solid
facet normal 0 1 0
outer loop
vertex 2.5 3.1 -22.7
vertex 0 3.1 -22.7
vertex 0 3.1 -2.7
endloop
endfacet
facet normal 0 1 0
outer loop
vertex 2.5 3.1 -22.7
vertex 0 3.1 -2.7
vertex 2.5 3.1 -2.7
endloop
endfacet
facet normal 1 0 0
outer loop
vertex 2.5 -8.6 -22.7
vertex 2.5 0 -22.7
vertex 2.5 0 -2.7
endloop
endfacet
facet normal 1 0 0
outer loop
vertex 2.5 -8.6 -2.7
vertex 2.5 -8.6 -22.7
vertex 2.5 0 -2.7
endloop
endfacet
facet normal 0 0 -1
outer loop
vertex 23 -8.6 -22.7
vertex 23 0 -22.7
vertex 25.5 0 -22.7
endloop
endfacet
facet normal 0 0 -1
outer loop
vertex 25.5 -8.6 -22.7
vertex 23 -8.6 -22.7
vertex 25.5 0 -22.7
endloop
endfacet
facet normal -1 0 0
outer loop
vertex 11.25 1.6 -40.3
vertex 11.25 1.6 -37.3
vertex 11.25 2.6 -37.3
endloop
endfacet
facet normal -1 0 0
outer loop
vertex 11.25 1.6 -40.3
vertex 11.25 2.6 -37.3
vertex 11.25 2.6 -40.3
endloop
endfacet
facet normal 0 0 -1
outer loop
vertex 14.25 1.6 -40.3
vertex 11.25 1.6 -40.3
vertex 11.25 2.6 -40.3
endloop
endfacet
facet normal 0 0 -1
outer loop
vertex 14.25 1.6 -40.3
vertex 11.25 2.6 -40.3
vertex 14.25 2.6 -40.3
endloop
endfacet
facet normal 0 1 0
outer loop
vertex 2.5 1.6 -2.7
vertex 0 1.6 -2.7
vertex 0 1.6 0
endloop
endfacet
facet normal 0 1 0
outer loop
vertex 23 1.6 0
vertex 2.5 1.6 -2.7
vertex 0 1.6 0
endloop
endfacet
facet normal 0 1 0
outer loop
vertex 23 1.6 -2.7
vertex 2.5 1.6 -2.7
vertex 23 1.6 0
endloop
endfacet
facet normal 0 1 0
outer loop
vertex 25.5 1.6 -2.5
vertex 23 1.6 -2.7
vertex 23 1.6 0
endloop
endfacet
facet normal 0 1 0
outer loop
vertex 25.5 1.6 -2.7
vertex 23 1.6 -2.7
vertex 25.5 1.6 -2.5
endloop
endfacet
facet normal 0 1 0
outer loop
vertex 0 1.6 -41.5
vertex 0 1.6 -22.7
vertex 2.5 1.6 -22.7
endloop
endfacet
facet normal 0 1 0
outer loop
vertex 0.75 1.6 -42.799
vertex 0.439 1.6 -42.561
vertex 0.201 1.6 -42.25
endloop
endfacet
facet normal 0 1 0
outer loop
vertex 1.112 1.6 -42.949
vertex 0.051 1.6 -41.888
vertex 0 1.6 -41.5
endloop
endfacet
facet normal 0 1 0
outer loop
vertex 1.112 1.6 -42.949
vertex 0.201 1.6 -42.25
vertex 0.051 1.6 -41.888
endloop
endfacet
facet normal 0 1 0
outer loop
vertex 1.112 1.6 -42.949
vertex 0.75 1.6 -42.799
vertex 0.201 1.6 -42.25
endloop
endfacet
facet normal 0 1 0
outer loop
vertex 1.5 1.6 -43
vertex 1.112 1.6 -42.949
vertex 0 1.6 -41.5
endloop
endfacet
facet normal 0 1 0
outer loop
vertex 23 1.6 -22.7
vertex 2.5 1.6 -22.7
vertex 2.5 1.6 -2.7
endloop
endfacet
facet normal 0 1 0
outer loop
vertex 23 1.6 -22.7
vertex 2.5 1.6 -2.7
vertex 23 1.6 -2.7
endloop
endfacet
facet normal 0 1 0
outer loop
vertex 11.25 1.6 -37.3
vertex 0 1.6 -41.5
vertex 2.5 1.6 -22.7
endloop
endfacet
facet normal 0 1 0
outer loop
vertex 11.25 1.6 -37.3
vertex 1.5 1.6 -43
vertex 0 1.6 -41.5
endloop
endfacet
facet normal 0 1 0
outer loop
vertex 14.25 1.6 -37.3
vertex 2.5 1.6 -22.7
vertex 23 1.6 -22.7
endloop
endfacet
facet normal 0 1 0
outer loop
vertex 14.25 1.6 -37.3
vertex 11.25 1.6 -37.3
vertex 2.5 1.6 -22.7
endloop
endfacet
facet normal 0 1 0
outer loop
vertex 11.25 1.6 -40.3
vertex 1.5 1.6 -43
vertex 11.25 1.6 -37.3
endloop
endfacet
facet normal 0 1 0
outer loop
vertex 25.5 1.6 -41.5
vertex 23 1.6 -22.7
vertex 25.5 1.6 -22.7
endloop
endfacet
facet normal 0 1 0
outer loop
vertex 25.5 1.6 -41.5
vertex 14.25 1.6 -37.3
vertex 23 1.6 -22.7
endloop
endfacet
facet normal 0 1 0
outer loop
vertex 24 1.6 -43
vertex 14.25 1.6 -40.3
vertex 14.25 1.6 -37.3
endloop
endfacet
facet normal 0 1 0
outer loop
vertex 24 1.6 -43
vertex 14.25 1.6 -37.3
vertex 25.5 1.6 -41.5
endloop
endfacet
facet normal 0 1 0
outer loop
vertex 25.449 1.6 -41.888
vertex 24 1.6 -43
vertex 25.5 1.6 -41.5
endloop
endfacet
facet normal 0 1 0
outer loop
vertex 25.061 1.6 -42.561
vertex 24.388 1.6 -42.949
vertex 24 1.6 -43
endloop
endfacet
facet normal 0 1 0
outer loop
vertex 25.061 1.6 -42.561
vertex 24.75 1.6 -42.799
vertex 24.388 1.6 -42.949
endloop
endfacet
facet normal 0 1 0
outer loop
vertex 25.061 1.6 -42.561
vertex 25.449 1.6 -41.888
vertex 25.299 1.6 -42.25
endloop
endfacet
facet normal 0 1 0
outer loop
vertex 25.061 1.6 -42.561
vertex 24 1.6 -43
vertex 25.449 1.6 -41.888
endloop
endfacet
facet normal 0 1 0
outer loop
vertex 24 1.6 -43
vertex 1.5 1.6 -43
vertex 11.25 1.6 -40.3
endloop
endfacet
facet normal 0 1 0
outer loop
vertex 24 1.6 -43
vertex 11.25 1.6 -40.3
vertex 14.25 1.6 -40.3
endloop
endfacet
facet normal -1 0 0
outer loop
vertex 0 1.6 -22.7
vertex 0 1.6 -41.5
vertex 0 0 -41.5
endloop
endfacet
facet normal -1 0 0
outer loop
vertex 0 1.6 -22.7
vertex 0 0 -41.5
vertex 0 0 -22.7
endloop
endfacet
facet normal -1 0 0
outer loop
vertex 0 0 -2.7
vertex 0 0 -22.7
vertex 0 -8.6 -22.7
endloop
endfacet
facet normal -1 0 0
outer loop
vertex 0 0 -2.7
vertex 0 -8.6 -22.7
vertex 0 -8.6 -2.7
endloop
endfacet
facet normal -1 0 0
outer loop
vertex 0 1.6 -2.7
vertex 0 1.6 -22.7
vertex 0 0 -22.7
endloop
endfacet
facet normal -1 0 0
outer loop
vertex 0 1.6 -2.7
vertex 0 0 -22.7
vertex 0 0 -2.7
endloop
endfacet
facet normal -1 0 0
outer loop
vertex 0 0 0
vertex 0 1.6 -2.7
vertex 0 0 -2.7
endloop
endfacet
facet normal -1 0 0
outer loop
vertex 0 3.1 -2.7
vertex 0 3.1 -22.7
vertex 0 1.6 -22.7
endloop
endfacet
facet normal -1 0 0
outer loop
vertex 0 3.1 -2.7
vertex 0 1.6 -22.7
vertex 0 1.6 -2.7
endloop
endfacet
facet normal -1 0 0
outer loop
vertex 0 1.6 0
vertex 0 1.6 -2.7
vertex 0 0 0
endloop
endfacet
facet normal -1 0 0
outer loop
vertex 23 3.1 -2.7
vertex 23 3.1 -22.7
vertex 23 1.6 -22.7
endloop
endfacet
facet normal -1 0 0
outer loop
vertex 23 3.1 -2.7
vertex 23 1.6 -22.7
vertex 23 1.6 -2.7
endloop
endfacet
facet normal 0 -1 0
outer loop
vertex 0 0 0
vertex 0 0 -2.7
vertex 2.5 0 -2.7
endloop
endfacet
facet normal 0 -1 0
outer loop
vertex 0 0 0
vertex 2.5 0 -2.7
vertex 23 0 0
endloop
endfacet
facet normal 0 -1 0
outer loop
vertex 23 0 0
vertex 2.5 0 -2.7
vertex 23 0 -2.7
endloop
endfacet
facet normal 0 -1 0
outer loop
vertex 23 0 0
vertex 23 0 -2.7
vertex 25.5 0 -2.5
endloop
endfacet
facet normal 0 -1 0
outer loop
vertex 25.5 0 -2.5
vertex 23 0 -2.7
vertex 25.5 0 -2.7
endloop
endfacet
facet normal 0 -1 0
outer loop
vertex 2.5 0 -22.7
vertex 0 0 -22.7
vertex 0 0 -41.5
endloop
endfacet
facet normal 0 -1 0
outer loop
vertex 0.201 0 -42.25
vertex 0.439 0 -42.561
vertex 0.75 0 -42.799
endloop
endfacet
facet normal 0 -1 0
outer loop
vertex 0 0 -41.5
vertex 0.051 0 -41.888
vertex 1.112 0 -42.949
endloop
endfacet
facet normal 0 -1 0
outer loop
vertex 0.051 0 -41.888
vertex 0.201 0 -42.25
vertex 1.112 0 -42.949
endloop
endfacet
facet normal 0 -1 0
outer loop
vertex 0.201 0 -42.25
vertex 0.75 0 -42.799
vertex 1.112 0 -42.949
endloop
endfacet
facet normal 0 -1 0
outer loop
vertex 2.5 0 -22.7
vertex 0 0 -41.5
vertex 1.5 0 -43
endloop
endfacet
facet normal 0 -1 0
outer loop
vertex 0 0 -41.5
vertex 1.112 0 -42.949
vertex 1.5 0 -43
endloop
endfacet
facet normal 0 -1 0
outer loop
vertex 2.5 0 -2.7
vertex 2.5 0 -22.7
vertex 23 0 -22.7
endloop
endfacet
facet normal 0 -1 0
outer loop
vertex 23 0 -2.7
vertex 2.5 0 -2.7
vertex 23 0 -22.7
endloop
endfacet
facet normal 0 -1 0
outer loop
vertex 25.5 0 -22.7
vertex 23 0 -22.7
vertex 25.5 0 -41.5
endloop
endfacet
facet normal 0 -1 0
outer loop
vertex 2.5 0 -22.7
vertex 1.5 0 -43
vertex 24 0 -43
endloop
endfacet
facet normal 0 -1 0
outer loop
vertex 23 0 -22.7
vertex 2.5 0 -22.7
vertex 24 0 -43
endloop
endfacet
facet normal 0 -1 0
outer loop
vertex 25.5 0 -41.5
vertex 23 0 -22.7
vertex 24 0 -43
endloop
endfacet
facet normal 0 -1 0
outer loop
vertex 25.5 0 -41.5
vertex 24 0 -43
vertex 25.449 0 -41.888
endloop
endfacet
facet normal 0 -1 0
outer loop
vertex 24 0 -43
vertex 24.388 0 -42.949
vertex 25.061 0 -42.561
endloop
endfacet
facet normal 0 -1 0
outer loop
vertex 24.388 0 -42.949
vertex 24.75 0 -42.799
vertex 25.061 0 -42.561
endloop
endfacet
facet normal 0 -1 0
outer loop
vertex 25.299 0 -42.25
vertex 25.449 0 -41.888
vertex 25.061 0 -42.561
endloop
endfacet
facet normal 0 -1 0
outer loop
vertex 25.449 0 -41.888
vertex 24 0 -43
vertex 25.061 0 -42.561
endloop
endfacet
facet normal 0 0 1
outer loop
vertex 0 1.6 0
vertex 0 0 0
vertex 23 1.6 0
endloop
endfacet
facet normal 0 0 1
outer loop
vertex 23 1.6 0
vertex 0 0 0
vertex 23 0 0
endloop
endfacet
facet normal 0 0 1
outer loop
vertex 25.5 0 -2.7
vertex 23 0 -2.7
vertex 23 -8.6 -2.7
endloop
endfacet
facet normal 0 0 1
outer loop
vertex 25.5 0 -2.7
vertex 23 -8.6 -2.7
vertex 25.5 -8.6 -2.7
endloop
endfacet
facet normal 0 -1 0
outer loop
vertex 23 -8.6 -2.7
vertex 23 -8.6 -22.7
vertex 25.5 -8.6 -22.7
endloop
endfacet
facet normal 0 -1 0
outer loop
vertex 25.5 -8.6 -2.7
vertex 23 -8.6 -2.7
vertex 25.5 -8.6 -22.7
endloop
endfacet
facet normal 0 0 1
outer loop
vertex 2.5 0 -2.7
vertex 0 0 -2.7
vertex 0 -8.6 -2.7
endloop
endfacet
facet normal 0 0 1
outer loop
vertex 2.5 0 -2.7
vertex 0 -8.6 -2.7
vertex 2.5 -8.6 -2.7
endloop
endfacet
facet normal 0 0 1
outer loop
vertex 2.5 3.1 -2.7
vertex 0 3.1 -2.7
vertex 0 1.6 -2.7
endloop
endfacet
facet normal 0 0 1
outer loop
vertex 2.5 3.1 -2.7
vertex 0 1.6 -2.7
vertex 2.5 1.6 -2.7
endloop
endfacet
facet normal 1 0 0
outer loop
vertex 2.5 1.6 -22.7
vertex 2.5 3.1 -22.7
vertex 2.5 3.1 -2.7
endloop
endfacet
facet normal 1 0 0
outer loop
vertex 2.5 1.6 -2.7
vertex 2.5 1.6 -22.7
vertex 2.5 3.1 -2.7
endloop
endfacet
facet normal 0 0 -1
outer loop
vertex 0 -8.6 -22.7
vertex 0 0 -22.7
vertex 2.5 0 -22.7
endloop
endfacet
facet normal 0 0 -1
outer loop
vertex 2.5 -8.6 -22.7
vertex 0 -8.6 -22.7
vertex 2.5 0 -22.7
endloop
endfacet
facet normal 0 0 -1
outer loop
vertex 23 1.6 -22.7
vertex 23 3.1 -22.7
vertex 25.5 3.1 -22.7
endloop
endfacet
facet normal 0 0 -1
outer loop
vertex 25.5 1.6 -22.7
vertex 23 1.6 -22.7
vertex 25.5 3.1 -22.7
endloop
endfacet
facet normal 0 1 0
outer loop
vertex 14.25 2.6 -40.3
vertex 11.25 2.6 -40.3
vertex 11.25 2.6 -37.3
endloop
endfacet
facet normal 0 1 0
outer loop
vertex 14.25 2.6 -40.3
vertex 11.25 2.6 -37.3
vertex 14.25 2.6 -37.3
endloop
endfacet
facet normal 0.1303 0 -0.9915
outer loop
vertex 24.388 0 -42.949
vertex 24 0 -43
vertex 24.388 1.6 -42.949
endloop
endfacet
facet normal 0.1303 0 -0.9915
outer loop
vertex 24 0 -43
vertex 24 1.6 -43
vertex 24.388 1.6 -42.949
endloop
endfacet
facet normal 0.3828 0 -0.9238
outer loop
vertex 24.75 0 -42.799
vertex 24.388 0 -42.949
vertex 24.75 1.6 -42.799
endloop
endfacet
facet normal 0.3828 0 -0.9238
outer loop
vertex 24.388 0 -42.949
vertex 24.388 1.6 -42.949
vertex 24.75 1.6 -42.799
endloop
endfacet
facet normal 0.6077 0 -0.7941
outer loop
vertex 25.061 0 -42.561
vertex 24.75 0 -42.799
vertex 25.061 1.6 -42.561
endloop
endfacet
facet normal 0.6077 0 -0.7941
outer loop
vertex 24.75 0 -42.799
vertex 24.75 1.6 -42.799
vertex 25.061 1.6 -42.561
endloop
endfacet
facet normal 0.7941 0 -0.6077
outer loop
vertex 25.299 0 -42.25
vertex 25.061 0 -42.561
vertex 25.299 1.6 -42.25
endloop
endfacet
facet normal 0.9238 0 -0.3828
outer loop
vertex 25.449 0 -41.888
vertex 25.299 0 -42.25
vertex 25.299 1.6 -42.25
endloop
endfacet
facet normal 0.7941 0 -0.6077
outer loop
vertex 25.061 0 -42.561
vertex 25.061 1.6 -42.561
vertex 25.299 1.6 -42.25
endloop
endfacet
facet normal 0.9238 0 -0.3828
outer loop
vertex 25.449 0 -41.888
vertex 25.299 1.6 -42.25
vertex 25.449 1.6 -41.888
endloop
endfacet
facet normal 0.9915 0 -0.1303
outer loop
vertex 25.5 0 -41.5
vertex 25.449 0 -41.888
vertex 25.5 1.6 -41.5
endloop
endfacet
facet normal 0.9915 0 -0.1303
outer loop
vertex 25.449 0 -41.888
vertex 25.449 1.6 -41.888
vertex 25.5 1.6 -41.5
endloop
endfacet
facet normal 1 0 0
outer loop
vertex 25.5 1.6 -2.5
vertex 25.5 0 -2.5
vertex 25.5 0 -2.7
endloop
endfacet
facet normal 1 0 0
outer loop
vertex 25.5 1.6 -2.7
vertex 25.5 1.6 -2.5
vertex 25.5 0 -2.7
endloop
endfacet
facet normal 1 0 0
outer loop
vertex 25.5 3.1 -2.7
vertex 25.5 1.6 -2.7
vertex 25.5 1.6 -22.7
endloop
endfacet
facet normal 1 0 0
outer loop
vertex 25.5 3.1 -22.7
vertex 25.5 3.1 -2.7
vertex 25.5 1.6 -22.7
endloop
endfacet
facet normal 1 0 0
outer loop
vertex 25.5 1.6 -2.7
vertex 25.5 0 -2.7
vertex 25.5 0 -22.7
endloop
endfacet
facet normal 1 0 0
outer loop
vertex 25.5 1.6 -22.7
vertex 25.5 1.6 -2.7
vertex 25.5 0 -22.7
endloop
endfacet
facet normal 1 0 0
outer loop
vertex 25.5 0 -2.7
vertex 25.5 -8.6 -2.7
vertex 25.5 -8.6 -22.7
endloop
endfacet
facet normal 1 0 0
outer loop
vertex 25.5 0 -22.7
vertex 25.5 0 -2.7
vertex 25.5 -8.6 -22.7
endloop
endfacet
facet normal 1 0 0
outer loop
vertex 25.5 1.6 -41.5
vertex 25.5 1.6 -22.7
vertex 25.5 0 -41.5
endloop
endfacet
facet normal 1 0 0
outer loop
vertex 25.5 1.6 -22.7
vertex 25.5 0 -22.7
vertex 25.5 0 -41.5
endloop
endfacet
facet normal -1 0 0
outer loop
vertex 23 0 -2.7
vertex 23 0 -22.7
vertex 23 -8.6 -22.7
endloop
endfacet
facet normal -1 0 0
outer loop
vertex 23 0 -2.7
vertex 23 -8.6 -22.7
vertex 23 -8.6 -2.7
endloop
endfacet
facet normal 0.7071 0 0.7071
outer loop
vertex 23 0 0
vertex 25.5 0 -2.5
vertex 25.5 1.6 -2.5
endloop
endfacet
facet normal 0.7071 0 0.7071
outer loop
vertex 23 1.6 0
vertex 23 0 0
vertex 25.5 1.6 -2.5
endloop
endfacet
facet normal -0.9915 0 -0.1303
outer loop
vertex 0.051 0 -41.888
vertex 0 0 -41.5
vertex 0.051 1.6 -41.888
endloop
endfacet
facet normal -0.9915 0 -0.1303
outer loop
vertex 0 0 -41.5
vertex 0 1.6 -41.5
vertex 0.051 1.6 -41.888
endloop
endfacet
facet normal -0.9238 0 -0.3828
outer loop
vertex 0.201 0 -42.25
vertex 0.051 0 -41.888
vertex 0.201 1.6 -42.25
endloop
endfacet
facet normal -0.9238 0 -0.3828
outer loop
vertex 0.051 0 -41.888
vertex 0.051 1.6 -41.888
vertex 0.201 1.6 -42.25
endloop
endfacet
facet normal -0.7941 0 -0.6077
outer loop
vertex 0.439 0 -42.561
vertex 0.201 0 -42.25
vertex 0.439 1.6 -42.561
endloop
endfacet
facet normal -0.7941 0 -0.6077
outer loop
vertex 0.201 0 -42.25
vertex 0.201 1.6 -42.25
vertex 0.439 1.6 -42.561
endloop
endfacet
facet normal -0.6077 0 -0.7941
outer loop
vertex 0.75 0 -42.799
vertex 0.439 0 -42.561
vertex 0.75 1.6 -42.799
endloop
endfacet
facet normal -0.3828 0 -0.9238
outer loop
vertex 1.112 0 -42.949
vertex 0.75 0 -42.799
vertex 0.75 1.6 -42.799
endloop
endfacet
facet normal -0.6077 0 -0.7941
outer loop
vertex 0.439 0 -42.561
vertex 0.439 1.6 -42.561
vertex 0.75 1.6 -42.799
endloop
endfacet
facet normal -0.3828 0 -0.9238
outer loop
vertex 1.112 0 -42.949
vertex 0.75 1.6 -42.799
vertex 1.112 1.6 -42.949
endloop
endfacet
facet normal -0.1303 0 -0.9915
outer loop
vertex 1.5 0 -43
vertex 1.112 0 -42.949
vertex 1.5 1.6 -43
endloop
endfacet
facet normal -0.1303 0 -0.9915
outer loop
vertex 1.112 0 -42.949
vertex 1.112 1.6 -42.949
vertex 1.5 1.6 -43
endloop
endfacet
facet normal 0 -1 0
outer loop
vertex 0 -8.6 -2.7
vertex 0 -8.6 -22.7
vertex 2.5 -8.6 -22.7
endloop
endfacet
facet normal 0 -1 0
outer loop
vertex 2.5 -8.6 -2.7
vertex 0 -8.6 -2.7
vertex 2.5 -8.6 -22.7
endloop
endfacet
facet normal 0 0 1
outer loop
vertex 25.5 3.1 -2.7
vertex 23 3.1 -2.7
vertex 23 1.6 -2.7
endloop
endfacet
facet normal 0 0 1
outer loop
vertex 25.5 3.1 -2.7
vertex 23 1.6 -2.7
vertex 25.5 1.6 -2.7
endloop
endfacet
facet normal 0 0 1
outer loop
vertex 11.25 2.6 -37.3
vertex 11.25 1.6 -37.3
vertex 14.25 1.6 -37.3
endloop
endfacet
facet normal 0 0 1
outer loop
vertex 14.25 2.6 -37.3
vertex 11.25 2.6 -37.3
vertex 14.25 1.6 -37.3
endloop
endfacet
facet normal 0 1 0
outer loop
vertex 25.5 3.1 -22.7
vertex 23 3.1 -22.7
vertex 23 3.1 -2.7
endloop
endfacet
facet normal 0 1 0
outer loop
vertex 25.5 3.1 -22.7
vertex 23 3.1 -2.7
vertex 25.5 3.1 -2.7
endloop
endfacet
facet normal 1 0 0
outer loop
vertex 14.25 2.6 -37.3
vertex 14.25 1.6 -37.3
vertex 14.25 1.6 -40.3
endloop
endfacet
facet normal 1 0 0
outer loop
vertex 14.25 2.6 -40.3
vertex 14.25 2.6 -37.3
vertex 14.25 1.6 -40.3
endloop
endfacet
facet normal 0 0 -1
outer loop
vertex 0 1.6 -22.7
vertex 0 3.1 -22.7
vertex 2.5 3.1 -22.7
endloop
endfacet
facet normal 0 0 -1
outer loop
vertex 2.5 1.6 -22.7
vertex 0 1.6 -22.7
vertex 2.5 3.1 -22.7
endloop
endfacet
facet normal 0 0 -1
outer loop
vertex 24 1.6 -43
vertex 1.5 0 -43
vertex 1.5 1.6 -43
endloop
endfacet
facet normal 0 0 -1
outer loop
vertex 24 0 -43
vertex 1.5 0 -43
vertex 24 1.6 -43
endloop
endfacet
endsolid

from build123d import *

# Parameters (mm, degrees)
SKETCH1_W                = 25.5
SKETCH1_H                = 43
BOSS_EXTRUDE1_DEPTH      = 1.6
BOSS_EXTRUDE2_DEPTH      = 8.6
BOSS_EXTRUDE2_DEPTH_BACK = 3.1
SKETCH2_W                = 2.5
SKETCH2_H                = 20
SKETCH3_W                = 3
SKETCH3_H                = 3
BOSS_EXTRUDE3_DEPTH      = 1
FILLET1_R                = 1.5
CHAMFER1_SIZE            = 2.5


with BuildPart() as part:
    # Sketch1 → Boss-Extrude1 (new body)
    with BuildSketch(Plane(origin=(0, 0, 0), x_dir=(1, 0, 0), z_dir=(0, 1, 0))):
        with Locations((12.75, 21.5)):
            Rectangle(SKETCH1_W, SKETCH1_H)
    extrude(amount=BOSS_EXTRUDE1_DEPTH)

    # Sketch2 → Boss-Extrude2 (add, two sides: drawn at the far end of the back side and taken through both)
    with BuildSketch(Plane.XZ.offset(-BOSS_EXTRUDE2_DEPTH_BACK)):
        with Locations((1.25, -12.7)):
            Rectangle(SKETCH2_W, SKETCH2_H)
        with Locations((24.25, -12.7)):
            Rectangle(SKETCH2_W, SKETCH2_H)
    extrude(amount=BOSS_EXTRUDE2_DEPTH + BOSS_EXTRUDE2_DEPTH_BACK)

    # Sketch3 → Boss-Extrude3 (add)
    with BuildSketch(Plane(origin=(0, 1.6, 0), x_dir=(1, 0, 0), z_dir=(0, 1, 0))):
        with Locations((12.75, 38.8)):
            Rectangle(SKETCH3_W, SKETCH3_H)
    extrude(amount=BOSS_EXTRUDE3_DEPTH)

    # Fillet1
    fillet1_edges = [part.edges().sort_by_distance(p)[0] for p in [
        (0, 0.8, -43),
        (25.5, 0.8, -43),
    ]]
    fillet(fillet1_edges, radius=FILLET1_R)

    # Chamfer1
    chamfer1_edges = [part.edges().sort_by_distance(p)[0] for p in [
        (25.5, 0.8, 0),
    ]]
    chamfer(chamfer1_edges, length=CHAMFER1_SIZE)


solid = part.part
